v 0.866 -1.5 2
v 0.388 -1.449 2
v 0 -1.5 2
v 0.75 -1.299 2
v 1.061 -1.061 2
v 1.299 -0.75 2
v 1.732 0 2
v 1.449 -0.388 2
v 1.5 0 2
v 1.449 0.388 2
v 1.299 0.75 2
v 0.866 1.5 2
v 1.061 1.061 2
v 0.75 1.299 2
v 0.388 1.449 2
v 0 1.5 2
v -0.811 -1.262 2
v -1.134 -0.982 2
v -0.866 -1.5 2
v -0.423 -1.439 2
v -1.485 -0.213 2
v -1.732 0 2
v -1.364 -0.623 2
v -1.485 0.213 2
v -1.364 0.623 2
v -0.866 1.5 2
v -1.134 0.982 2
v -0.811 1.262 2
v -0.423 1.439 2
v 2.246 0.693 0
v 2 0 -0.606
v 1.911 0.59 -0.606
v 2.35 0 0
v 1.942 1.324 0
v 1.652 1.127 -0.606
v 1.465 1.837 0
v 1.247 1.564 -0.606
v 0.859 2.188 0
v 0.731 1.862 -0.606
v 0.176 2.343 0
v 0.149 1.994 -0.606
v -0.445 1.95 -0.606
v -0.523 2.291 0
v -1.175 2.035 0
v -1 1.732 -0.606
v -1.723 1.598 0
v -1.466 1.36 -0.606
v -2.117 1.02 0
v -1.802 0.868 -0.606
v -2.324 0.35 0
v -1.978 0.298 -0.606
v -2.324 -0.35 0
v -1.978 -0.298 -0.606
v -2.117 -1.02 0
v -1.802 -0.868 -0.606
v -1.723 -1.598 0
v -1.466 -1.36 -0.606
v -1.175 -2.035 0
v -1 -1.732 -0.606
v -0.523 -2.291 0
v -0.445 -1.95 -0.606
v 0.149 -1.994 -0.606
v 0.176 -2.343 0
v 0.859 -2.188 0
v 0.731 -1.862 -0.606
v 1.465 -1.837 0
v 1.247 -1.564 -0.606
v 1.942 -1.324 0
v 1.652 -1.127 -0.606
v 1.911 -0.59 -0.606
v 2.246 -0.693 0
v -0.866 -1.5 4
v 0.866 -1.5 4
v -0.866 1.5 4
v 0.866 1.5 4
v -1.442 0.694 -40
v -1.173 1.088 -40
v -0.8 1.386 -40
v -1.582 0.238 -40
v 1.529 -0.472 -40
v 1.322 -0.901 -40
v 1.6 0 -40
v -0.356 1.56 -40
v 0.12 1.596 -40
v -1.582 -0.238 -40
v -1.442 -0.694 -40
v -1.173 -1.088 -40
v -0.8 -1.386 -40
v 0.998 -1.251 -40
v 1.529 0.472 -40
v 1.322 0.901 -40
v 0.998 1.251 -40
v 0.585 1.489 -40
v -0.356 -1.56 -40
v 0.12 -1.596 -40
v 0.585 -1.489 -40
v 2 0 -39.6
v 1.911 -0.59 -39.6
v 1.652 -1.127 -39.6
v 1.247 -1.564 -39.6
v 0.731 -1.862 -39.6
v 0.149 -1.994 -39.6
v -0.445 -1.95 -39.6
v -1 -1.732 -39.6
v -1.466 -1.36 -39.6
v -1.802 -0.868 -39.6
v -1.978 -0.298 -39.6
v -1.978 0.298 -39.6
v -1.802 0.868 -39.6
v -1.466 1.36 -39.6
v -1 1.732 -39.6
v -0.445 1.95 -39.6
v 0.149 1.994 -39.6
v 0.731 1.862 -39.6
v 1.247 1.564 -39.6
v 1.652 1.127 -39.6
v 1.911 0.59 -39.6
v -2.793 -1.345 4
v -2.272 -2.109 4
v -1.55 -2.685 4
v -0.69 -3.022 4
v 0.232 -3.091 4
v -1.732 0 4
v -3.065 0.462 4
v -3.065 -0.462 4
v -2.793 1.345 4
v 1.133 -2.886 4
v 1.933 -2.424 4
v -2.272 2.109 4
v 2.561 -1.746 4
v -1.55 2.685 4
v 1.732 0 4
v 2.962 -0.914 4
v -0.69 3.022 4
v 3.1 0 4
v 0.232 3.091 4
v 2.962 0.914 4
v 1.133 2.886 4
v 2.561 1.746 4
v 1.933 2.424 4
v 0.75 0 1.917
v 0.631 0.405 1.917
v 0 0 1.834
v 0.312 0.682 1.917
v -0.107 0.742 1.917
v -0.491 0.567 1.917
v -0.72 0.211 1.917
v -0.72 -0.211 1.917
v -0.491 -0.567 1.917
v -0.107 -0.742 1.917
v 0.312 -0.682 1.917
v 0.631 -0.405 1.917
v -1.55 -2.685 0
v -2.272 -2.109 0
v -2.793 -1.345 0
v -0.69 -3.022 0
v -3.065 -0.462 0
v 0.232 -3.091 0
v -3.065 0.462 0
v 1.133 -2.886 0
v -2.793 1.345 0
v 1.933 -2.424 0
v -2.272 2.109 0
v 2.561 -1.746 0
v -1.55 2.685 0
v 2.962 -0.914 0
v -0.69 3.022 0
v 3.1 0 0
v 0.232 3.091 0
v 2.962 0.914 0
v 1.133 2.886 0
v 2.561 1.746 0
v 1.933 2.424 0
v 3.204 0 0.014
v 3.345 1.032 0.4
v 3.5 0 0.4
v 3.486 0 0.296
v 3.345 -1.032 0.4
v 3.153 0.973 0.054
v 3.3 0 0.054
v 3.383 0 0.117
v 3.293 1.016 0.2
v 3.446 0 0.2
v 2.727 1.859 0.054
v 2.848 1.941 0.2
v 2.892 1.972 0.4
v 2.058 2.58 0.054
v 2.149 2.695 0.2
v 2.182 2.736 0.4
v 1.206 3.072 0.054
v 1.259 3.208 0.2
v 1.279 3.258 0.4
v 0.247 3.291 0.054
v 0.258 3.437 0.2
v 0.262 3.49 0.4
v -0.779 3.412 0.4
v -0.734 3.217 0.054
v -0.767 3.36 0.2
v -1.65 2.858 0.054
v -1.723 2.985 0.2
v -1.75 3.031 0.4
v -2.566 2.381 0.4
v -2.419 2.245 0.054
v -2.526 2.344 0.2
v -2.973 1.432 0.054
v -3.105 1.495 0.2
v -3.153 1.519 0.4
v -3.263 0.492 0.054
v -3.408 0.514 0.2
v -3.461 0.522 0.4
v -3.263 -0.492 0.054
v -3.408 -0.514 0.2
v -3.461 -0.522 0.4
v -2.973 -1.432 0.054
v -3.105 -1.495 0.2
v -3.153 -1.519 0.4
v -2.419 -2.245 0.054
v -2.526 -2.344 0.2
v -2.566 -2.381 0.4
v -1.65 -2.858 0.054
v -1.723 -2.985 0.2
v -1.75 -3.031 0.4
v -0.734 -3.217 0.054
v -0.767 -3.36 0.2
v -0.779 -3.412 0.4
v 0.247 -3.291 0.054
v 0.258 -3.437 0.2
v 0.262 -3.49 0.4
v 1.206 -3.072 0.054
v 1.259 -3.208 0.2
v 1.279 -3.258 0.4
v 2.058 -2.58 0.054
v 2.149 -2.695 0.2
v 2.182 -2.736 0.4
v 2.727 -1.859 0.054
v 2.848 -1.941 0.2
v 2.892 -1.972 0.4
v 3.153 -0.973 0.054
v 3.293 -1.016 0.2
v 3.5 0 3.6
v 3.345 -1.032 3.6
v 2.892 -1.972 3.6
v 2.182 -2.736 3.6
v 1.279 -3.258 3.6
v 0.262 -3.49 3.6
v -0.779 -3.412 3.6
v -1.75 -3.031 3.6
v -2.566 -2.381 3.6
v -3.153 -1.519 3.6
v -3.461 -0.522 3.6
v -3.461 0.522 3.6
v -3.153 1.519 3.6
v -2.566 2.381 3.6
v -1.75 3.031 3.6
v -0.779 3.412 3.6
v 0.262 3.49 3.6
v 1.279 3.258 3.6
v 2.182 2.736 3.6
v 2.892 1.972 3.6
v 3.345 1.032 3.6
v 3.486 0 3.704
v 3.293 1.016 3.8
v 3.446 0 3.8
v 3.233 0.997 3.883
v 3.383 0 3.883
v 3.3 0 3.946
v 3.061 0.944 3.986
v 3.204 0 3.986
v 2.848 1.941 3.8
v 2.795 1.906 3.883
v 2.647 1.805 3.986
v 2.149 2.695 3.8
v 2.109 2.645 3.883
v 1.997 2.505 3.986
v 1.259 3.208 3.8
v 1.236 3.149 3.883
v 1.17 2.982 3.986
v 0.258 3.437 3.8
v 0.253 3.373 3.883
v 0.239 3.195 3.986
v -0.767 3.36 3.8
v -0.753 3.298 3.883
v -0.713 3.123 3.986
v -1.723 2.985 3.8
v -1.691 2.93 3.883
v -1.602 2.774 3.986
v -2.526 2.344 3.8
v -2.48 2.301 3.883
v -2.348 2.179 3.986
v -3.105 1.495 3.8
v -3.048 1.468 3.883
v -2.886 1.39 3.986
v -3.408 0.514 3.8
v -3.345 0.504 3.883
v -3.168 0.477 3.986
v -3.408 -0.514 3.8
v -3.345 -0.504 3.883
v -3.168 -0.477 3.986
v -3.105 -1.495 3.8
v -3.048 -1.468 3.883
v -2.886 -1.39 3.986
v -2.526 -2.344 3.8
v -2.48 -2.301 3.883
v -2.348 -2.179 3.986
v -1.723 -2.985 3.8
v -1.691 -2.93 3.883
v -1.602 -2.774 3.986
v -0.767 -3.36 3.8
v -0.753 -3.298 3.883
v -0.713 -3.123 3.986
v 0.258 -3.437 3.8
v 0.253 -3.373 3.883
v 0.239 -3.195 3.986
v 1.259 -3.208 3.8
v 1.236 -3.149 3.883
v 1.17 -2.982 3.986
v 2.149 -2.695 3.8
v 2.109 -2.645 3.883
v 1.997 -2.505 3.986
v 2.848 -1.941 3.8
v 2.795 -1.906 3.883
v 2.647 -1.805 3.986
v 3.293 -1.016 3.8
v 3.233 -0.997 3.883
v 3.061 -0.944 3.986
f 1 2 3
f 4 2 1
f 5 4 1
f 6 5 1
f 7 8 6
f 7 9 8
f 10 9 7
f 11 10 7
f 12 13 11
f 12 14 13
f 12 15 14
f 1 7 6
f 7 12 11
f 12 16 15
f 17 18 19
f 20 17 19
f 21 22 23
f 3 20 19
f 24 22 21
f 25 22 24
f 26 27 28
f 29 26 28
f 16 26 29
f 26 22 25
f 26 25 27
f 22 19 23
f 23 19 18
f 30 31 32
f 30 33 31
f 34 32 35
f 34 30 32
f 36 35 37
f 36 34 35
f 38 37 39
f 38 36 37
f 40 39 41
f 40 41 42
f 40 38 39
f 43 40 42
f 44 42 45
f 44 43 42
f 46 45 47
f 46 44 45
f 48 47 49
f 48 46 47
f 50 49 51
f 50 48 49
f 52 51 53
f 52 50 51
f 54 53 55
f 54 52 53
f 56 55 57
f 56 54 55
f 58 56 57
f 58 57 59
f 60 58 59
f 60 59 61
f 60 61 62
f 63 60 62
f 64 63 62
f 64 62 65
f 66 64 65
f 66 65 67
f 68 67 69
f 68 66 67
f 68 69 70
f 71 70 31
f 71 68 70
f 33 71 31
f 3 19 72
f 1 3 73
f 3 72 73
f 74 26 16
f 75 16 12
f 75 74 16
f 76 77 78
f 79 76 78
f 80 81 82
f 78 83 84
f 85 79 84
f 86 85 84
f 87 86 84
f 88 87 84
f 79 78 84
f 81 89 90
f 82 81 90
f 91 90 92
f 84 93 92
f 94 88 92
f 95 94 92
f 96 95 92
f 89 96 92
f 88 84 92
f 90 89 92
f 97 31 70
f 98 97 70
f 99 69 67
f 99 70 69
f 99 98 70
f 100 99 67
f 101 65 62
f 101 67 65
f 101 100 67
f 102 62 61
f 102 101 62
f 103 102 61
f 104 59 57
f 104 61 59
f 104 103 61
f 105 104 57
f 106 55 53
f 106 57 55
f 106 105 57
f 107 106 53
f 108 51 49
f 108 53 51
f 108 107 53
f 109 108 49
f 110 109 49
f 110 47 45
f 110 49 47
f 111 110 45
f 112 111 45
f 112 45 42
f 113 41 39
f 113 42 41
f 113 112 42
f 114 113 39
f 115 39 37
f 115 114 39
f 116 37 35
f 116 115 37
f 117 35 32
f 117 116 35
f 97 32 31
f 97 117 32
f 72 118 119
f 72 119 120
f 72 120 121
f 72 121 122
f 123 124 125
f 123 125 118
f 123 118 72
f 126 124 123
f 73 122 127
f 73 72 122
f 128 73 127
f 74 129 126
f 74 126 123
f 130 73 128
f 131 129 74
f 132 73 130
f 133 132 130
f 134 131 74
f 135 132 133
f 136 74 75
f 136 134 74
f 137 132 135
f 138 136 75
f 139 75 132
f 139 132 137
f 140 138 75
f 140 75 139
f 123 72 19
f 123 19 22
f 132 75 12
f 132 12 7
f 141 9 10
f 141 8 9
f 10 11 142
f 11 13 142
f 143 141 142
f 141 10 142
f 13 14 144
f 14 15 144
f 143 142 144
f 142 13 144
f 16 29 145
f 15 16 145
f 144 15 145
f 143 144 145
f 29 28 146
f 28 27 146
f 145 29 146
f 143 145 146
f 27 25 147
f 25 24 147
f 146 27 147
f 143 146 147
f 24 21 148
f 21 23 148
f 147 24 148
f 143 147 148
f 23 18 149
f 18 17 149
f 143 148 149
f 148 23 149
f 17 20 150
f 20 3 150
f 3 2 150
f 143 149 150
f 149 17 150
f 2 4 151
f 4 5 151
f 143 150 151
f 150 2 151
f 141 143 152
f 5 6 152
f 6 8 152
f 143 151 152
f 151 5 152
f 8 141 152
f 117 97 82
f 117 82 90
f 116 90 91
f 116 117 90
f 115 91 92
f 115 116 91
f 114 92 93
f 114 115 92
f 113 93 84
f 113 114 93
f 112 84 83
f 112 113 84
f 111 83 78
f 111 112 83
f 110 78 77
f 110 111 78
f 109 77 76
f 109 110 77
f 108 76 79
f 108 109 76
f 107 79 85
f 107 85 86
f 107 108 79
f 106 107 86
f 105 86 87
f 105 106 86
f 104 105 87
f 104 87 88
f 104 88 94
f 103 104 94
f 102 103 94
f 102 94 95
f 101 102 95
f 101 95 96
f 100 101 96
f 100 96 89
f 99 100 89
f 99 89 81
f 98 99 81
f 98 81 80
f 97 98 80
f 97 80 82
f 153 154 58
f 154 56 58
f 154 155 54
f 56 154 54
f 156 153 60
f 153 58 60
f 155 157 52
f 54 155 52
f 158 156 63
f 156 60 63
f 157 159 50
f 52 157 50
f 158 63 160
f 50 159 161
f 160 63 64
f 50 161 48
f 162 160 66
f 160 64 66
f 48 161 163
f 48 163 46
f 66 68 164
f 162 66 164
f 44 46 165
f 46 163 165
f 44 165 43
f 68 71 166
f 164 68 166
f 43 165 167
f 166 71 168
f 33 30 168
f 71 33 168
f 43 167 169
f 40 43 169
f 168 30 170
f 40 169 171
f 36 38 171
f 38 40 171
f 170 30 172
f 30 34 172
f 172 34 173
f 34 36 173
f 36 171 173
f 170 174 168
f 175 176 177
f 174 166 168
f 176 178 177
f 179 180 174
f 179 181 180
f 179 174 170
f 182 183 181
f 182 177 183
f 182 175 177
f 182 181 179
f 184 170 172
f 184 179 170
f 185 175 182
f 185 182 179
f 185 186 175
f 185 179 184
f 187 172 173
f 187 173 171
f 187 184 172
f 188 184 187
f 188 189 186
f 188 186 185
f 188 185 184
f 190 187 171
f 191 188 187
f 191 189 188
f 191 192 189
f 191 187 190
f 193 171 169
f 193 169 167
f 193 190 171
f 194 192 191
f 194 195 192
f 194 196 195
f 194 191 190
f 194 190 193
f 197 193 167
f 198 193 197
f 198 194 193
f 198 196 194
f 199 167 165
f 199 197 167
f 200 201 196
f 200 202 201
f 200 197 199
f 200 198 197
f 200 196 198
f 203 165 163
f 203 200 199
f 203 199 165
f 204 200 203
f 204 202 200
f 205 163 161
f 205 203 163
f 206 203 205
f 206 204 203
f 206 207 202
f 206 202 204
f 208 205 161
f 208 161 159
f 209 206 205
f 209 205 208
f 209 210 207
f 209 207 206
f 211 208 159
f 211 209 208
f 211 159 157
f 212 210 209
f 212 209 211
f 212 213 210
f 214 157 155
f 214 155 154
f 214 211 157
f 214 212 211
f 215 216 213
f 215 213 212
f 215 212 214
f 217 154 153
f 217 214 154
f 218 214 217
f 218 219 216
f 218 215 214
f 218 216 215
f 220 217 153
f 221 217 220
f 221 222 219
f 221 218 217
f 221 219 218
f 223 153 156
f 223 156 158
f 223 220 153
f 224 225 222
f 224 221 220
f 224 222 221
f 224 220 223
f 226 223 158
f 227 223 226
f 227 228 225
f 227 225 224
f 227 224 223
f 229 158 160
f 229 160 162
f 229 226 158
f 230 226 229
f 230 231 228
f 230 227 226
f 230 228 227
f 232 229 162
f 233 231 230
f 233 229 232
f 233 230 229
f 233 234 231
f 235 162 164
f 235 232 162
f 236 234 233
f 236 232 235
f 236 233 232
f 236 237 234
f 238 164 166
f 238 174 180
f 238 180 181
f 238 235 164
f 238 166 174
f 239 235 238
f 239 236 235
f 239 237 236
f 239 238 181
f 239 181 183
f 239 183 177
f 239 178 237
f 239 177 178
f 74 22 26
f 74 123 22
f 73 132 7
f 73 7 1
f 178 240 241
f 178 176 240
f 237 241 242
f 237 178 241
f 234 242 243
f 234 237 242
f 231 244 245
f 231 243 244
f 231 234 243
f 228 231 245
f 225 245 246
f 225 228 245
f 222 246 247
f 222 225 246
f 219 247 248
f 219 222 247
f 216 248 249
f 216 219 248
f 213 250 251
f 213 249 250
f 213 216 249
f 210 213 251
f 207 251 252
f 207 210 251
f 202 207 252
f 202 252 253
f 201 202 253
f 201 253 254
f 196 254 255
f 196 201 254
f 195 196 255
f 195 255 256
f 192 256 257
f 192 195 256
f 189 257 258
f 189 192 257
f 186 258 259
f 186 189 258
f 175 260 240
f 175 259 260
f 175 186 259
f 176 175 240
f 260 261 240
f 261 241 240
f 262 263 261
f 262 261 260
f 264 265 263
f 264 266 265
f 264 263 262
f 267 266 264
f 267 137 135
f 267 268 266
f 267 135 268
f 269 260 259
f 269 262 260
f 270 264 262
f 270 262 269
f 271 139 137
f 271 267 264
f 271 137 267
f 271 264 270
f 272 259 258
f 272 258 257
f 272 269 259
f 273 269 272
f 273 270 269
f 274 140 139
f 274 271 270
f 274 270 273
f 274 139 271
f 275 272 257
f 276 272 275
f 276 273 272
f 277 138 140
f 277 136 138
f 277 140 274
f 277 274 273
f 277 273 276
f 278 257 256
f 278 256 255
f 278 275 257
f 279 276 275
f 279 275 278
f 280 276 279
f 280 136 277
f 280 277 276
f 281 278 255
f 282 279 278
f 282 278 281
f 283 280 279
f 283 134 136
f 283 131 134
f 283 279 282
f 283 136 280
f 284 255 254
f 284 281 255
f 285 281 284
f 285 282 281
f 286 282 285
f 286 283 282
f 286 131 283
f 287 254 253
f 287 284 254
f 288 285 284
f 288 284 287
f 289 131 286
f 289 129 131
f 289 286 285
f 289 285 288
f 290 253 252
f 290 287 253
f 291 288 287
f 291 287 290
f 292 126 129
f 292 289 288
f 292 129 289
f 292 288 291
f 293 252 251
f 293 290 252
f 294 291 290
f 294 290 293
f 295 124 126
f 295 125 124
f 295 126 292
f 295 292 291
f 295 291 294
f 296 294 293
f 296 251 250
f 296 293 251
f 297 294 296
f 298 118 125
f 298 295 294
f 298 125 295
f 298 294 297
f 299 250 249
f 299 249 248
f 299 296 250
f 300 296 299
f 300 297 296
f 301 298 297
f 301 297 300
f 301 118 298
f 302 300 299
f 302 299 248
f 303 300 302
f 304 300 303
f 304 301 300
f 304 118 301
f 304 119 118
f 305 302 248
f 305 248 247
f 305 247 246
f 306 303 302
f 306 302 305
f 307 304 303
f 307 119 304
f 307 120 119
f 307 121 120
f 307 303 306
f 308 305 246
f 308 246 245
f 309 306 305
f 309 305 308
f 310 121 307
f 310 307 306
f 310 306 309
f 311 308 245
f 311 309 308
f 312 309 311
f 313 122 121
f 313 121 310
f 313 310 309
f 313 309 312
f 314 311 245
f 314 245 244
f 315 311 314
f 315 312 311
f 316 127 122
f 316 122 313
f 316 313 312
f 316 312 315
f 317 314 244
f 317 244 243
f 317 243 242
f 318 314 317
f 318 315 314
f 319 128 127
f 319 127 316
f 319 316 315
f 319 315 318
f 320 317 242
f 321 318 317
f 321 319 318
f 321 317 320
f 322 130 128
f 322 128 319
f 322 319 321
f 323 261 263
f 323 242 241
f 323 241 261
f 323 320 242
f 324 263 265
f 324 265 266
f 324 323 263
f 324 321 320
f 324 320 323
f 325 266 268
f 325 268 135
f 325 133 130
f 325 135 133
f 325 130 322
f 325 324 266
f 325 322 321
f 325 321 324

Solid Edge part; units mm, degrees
sketch "Sketch1" plane through (0, 0, 0) normal (0, -1, 0) x (1, 0, 0)
  line L0 (3.5, 4) -> (3.5, 0)
  line L1 (3.5, 0) -> (2.35, 0)
  line L2 (2.35, 0) -> (2, -0.6062)
  line L3 (2, -0.6062) -> (2, -40)
  line L4 (2, -40) -> (0, -40)
  line L5 (1.5, 2) -> (0, 1.834)
  line L6 (1.5, 4) -> (1.5, 2)
  line L7 (3.5, 4) -> (1.5, 4)
  dimension "D1" = 2
  dimension "D2" = 40
  dimension "D3" = 4
revolve "RevolvedProtrusion1" add sketch "Sketch1" angle 360 about axis through (0, 0, -6) along (0, 0, 1)
cosmetic_thread "Thread1" size "M4"
chamfer "Chamfer_1" distance 0.4 angle 45 1 edges at (-2, 0, -40)
fillet "Round_1" radius 0.4 2 edges at (-3.5, 0, 0) (-3.5, 0, 4)
sketch "Sketch2" plane through (0, 0, 4) normal (0, 0, 1) x (0, 1, 0)
  line L0 (-1.5, 0.866) -> (-1.5, -0.866)
  line L1 (0, -1.7321) -> (-1.5, -0.866)
  line L2 (1.5, -0.866) -> (0, -1.7321)
  line L3 (1.5, 0.866) -> (1.5, -0.866)
  line L4 (0, 1.7321) -> (1.5, 0.866)
  line L5 (-1.5, 0.866) -> (0, 1.7321)
extrude "Cutout1" cut sketch "Sketch2" against normal up to vertex (2 mm away)
properties material "Galvanized steel"
